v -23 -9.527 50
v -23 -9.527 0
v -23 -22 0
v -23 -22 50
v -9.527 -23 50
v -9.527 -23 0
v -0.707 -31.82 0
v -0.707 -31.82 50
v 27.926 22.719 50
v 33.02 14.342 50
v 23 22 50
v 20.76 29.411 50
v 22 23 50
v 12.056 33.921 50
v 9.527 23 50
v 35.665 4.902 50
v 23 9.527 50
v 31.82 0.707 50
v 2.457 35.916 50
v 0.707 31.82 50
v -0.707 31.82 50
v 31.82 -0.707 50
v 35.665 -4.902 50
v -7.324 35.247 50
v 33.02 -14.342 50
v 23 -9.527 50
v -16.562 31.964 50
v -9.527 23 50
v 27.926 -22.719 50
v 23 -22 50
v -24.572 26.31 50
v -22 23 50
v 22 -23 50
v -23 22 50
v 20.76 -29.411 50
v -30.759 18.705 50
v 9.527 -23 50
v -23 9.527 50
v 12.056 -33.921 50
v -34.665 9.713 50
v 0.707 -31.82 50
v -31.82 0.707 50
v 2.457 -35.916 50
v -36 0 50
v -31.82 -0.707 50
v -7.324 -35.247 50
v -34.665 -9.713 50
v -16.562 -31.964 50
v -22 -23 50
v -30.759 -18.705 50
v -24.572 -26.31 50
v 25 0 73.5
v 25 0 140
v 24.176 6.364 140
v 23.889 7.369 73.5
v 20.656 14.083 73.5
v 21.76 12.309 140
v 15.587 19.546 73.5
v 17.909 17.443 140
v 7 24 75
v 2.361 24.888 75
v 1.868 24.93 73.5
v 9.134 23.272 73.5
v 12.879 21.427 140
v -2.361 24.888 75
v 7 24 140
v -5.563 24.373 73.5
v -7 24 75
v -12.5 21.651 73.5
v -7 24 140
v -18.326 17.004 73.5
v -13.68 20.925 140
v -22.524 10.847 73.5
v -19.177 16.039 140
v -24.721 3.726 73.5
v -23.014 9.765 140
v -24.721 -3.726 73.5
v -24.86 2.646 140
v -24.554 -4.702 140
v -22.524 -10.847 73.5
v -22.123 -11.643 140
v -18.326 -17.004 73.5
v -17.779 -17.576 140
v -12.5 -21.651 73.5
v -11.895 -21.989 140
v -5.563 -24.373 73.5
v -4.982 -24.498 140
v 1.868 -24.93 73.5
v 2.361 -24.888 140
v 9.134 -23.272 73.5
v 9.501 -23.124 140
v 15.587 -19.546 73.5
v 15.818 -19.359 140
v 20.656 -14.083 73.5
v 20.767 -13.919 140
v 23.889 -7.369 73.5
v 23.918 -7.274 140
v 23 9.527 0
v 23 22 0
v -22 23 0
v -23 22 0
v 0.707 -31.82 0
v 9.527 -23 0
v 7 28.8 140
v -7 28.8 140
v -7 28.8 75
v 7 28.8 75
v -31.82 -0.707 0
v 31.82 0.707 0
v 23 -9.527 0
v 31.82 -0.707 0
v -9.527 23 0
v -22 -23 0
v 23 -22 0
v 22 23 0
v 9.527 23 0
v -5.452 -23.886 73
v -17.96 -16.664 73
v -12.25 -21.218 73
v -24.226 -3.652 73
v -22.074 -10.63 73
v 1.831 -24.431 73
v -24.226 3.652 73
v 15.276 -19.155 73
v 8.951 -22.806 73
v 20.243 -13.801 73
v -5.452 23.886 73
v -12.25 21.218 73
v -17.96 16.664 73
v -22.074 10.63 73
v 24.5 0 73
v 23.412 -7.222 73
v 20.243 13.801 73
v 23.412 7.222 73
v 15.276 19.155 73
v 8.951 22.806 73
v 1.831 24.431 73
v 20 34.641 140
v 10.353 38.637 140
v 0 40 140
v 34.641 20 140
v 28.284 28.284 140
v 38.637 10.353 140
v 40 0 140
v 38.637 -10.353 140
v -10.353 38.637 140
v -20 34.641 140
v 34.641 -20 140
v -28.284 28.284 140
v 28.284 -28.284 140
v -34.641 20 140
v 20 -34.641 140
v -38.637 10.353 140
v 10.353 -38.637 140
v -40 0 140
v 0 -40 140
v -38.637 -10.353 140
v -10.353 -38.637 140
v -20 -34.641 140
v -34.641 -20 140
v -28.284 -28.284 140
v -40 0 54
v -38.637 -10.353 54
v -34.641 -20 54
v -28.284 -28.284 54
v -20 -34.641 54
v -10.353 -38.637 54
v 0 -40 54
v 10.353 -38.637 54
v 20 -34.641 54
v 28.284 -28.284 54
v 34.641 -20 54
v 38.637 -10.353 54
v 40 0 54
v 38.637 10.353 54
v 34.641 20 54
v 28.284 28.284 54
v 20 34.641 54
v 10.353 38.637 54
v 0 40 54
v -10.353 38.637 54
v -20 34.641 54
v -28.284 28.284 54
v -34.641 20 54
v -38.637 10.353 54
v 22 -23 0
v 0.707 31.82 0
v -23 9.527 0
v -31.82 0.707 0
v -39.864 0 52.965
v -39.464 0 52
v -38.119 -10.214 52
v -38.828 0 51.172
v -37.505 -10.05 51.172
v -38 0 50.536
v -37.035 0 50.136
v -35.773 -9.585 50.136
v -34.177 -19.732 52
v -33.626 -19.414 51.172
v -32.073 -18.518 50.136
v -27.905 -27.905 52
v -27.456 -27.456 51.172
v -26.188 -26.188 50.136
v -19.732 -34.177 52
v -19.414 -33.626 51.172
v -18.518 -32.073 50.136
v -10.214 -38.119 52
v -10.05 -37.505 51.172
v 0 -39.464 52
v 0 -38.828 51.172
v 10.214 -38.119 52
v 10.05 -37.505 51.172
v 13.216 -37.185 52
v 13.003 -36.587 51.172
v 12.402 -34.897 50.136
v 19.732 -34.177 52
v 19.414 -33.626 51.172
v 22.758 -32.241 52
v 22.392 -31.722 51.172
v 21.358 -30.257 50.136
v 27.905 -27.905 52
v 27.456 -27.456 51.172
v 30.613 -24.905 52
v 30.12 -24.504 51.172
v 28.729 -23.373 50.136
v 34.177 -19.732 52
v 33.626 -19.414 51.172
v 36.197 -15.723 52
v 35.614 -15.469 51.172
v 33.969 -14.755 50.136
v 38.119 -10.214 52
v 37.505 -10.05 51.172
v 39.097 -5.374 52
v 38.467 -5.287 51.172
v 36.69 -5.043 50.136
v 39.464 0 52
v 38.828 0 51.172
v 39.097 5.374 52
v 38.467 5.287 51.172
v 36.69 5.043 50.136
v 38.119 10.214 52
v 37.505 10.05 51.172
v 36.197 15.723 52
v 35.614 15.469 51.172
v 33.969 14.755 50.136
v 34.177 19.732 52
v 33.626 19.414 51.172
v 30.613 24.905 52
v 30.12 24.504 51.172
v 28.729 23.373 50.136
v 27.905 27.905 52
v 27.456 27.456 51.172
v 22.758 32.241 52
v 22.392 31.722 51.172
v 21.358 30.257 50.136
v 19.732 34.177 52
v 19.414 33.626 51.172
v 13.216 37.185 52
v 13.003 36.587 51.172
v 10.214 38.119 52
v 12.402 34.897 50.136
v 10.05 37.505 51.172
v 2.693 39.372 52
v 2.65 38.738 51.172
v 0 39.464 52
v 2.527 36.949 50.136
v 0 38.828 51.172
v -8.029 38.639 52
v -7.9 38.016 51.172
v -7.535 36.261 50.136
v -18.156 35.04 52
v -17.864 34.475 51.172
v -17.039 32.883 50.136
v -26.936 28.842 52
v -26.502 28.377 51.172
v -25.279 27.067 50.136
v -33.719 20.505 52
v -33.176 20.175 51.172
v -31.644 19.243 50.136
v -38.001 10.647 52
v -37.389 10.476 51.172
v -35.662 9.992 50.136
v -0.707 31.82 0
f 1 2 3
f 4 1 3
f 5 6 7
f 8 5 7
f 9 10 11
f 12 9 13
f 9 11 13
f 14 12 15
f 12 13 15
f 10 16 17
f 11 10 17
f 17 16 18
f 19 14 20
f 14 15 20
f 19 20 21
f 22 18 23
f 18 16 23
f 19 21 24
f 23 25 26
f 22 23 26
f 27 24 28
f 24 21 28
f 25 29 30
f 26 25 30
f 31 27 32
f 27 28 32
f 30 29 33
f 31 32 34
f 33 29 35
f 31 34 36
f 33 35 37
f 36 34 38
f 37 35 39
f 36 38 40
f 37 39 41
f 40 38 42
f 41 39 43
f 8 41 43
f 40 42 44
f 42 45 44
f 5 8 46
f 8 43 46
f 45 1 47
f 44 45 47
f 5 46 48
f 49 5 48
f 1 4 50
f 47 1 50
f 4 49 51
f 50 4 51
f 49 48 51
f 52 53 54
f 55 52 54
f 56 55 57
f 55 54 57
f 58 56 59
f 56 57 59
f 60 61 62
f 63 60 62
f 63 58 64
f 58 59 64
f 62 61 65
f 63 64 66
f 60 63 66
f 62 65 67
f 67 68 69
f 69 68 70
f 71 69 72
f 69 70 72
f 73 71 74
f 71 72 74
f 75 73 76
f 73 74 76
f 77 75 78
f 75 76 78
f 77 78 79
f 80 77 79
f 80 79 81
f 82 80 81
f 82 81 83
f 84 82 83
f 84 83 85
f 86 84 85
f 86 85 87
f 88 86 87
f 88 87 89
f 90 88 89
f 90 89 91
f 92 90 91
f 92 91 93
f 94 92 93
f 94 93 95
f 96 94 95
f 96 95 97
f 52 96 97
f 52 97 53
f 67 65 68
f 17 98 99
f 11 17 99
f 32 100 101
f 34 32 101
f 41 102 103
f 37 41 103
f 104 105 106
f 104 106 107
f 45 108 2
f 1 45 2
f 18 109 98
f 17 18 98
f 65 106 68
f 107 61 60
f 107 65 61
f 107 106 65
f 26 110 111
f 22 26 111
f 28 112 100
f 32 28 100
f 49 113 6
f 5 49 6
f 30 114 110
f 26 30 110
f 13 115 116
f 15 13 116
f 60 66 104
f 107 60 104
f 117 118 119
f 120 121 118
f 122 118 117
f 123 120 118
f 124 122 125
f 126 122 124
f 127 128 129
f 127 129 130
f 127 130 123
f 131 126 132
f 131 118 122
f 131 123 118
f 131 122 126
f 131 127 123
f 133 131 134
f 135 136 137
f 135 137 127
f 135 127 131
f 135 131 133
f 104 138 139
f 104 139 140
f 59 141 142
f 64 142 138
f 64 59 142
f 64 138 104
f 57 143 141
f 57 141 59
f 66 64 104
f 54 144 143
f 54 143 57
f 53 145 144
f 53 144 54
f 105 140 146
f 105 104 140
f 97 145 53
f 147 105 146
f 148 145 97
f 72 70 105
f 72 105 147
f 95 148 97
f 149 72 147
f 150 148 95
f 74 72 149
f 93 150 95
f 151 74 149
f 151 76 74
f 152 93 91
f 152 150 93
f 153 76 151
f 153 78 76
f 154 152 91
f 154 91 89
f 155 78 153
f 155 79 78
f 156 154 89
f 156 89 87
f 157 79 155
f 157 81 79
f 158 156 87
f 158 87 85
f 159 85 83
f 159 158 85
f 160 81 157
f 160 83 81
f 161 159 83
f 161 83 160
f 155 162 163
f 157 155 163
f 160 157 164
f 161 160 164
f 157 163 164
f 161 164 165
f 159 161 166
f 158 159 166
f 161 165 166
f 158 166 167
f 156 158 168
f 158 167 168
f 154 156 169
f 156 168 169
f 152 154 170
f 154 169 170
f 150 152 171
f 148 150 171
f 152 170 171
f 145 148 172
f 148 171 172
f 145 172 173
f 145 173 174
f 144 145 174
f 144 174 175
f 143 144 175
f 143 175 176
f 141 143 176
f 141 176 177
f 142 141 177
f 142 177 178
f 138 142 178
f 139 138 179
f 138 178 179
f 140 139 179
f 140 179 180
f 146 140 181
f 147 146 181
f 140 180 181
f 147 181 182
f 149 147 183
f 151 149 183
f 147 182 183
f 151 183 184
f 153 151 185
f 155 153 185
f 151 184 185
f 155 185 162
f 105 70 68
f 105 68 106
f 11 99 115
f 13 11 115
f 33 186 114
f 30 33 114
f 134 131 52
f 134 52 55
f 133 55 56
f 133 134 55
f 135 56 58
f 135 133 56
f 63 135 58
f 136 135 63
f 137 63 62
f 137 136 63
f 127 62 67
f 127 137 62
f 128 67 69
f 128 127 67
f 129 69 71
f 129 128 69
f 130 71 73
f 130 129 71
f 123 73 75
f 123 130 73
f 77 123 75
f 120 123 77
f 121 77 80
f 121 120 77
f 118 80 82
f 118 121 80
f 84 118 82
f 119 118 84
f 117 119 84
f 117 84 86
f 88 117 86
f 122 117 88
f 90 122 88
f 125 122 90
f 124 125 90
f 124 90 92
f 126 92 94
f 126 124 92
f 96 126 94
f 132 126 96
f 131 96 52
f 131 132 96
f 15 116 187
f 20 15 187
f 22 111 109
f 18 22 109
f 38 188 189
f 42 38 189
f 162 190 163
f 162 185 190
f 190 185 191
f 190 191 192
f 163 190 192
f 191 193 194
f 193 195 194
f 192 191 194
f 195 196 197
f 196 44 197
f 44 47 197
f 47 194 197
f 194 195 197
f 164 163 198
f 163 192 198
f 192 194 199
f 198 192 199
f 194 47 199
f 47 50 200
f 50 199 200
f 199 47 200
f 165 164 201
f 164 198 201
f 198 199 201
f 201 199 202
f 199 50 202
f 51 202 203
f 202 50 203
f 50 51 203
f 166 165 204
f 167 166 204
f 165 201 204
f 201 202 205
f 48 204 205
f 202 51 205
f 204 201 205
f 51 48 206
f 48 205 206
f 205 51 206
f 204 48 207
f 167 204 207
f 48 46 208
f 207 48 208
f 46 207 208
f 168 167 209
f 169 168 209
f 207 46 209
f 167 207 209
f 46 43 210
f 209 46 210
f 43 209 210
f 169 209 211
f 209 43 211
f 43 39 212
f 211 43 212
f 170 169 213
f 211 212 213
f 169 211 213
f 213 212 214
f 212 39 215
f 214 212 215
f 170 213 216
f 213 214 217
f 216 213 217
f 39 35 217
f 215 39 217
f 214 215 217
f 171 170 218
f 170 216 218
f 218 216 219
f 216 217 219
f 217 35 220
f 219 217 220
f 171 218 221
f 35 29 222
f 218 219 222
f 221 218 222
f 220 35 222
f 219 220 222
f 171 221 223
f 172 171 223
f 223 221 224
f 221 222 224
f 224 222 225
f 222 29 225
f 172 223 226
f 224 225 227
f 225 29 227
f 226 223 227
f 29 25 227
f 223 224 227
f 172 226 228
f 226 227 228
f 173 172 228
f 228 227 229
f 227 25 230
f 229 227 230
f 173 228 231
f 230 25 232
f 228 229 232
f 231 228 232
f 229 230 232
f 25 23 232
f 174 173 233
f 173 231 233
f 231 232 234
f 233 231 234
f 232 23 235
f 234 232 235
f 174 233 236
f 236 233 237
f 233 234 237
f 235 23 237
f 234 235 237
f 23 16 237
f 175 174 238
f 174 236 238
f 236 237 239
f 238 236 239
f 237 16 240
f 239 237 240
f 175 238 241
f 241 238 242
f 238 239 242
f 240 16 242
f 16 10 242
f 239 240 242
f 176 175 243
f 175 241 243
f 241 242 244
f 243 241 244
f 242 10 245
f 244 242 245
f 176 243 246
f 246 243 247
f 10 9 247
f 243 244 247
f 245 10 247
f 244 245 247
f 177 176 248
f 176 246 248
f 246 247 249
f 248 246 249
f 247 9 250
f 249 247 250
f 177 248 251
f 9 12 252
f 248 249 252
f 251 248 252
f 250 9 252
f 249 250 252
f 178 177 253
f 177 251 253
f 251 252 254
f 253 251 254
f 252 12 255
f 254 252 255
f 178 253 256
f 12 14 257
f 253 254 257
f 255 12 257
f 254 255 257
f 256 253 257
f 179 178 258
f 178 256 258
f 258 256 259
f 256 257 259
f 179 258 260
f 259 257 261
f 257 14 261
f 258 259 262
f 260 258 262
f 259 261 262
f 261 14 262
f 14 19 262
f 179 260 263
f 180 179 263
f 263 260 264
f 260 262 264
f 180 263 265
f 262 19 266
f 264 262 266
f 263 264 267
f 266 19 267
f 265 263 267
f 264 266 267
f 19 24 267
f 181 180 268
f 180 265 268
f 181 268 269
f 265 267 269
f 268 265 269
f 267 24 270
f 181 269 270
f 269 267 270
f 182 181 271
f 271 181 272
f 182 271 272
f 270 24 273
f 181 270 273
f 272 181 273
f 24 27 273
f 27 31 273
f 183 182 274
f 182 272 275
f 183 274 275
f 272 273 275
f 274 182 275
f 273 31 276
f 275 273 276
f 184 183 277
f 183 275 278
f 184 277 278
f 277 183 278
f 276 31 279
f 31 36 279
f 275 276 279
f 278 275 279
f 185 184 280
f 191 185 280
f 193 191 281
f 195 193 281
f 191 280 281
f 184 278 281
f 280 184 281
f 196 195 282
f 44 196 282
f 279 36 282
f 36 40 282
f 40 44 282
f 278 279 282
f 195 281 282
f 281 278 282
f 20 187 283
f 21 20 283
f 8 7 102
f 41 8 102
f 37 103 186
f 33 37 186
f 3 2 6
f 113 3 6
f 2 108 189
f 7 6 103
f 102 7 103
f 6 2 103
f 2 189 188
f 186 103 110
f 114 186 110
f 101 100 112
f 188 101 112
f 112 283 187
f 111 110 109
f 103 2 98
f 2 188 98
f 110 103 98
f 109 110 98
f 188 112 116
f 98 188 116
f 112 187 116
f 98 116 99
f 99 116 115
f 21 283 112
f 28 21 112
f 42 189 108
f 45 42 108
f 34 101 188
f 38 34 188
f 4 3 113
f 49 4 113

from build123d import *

# Parameters (mm, degrees)
BOSS_EXTRUDE1_DEPTH = 50
SKETCH2_R           = 40
BOSS_EXTRUDE2_DEPTH = 90
SKETCH3_R           = 25
CUT_EXTRUDE1_DEPTH  = 67
SKETCH4_W           = 14
SKETCH4_H           = 28.8
CUT_EXTRUDE2_DEPTH  = 65
FILLET1_R           = 4
CHAMFER1_SIZE       = 0.5


with BuildPart() as part:
    # Sketch1 → Boss-Extrude1 (new body)
    with BuildSketch(Plane.XY):
        Polygon((0.707106781, -31.819805153), (9.526911935, -23), (22, -23), (23, -22), (23, -9.526911935), (31.819805153, -0.707106781), (31.819805153, 0.707106781), (23, 9.526911935), (23, 22), (22, 23), (9.526911935, 23), (0.707106781, 31.819805153), (-0.707106781, 31.819805153), (-9.526911935, 23), (-22, 23), (-23, 22), (-23, 9.526911935), (-31.819805153, 0.707106781), (-31.819805153, -0.707106781), (-23, -9.526911935), (-23, -22), (-22, -23), (-9.526911935, -23), (-0.707106781, -31.819805153), align=None)
    extrude(amount=BOSS_EXTRUDE1_DEPTH)

    # Sketch2 → Boss-Extrude2 (add)
    with BuildSketch(Plane.XY.offset(50)):
        with Locations(Location((0, 0, 0), (0, 0, 180))):
            Circle(SKETCH2_R)
    extrude(amount=BOSS_EXTRUDE2_DEPTH)

    # Sketch3 → Cut-Extrude1 (cut)
    with BuildSketch(Plane.XY.offset(140)):
        Circle(SKETCH3_R)
    extrude(amount=-CUT_EXTRUDE1_DEPTH, mode=Mode.SUBTRACT)

    # Sketch4 → Cut-Extrude2 (cut)
    with BuildSketch(Plane.XY.offset(140)):
        with Locations((0, 14.4)):
            Rectangle(SKETCH4_W, SKETCH4_H)
    extrude(amount=-CUT_EXTRUDE2_DEPTH, mode=Mode.SUBTRACT)

    # Fillet1
    fillet1_edges = [part.edges().sort_by_distance(p)[0] for p in [
        (40, 0, 50),
    ]]
    fillet(fillet1_edges, radius=FILLET1_R)

    # Chamfer1
    chamfer1_edges = [part.edges().sort_by_distance(p)[0] for p in [
        (-25, 0, 73),
    ]]
    chamfer(chamfer1_edges, length=CHAMFER1_SIZE)


solid = part.part
